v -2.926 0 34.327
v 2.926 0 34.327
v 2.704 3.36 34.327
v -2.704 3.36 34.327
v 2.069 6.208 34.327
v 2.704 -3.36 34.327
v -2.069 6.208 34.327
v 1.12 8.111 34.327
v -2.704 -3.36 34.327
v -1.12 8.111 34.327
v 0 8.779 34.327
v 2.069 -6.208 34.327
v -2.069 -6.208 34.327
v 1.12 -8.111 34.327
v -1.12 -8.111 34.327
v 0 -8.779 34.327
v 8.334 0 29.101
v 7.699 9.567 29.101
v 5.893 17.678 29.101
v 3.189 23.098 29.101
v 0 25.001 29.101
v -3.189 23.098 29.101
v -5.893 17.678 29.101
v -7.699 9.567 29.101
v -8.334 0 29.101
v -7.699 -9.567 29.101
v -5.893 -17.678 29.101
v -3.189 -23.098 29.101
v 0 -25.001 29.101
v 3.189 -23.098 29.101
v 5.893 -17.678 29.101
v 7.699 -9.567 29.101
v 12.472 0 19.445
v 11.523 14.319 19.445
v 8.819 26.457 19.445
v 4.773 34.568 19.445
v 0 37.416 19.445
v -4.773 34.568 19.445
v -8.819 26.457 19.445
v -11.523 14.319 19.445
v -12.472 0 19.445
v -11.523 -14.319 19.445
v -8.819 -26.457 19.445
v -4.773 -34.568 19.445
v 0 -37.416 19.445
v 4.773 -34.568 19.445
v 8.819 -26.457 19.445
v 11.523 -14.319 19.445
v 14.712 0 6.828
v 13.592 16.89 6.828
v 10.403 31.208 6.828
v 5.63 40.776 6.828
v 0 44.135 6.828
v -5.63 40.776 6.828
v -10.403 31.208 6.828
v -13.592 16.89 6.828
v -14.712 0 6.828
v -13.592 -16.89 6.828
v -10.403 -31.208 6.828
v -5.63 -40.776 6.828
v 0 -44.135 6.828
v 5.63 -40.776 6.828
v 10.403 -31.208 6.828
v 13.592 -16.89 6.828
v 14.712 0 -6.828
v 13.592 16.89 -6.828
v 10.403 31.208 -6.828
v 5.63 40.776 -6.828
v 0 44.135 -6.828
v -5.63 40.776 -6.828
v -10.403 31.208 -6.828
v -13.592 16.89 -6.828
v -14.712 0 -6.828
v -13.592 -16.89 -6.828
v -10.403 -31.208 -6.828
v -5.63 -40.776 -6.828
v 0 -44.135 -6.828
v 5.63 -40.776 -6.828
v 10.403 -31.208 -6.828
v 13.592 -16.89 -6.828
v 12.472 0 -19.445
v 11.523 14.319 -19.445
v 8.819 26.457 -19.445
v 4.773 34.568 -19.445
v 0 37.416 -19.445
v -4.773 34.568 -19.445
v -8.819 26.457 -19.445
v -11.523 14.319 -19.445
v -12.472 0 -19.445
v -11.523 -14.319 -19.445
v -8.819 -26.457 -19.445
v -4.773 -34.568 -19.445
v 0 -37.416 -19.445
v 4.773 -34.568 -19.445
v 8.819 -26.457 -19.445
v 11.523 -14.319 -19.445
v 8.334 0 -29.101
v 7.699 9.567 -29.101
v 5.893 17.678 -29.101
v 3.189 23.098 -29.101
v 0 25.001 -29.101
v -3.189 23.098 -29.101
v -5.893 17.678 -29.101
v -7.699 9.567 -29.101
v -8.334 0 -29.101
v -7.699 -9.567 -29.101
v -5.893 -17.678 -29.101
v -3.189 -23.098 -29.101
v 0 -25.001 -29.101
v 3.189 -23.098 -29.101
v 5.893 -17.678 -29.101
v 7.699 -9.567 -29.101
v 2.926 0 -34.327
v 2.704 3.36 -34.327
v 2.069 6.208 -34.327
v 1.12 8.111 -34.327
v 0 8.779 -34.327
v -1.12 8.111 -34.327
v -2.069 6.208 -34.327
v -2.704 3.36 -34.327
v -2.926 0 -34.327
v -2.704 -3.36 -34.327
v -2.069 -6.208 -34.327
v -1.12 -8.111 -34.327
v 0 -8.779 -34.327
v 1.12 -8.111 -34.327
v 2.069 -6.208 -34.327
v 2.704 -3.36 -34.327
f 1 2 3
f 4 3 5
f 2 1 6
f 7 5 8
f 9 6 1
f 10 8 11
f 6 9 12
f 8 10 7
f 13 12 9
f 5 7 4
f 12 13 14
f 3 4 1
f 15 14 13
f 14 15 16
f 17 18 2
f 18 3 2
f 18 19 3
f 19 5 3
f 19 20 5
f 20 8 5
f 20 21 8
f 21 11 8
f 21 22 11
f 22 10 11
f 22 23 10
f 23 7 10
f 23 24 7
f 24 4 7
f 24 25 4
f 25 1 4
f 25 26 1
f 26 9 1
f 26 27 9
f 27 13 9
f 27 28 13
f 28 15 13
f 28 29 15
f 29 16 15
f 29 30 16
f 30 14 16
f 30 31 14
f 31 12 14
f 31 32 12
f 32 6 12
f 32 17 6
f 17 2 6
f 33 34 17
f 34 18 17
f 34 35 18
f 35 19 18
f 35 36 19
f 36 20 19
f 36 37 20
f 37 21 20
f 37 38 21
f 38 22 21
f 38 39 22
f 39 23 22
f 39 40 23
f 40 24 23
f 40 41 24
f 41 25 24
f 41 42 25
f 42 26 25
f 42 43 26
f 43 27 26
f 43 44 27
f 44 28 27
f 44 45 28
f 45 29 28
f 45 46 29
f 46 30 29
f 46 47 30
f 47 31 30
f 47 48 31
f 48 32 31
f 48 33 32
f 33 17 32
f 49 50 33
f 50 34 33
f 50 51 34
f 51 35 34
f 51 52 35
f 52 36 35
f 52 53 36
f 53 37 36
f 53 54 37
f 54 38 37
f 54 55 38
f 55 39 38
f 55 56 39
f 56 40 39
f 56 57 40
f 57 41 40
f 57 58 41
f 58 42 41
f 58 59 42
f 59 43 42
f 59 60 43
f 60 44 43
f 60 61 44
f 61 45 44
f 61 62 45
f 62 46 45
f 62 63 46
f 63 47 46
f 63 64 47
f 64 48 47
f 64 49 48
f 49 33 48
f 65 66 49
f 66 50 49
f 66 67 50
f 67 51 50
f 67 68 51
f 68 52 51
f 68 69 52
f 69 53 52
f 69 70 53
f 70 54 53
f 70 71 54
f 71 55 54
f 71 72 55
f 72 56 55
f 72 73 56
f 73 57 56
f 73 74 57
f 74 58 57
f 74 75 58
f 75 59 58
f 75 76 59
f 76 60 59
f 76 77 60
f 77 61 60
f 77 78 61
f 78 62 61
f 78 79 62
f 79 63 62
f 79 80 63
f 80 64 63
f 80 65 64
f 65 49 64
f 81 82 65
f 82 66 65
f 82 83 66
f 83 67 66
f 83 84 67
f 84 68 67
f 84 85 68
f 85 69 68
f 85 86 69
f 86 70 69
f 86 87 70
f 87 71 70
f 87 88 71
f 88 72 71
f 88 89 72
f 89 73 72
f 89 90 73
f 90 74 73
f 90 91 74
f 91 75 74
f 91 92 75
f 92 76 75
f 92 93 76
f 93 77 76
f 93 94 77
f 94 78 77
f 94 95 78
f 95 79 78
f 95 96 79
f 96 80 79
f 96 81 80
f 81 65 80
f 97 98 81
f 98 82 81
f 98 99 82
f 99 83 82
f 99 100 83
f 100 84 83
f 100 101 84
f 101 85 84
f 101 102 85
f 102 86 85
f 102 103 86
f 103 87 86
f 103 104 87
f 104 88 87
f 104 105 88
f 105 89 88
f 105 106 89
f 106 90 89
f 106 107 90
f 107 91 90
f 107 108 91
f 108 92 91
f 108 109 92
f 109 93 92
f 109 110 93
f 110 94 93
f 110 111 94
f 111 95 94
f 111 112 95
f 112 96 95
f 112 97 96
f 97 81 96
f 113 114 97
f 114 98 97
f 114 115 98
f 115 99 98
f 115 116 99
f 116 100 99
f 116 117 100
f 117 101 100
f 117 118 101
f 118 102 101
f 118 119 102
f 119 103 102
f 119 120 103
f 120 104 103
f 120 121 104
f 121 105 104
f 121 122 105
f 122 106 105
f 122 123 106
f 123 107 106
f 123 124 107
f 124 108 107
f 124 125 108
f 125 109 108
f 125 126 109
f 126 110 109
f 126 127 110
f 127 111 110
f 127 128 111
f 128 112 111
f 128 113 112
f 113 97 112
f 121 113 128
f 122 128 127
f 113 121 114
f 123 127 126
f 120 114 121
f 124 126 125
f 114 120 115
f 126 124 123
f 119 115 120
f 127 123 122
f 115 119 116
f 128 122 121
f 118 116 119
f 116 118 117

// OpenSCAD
// Generated by SolidPython 1.0.1 on 2020-07-29 00:46:45


scale(v = [3, 9, 7]) {
	sphere(r = 5);
}
/***********************************************
*********      SolidPython code:      **********
************************************************
 
# import packages: SolidPython
from solid import *
from solid.utils import *
from itertools import chain, combinations, permutations


class Resize:

    def __init__(self, scad_file):
        self.scad_file = scad_file
        #self.scad_file = import_scad(scad_file)
        # cone/cylinder param:
        self.r1 = 0
        self.r2 = 0
        self.h = 0
        # rectangular prism param:
        self.w = 0
        self.l = 0
        # ellipse param:
        self.r = 0

    # import OpenScad code (file name corresponds to shape)


    # classify shape + parameters
    def assign(self, param1, param2, param3):
        if self.scad_file == 'cone.scad':
            self.r1 = param1
            self.r2 = param2
            self.h = param3
        elif self.scad_file == 'cylinder.scad':
            self.r1 = param1
            self.r2 = param2
            self.h = param3
        elif self.scad_file == 'rectangularPrism.scad':
            self.h = param1
            self.l = param2
            self.w = param3
        else:
            self.r = param1
            self.h = param2

    # resize parameters
    def iterate(self):
        x = range(3, 20, 2)
        i = 1
        if self.scad_file == 'cone.scad':
            tempList = list(permutations(x, 2))
            for temp in tempList:
                param1 = temp[0]
                param2 = temp[1]
                filepath = 'produced_scad_files/' + 'cone' + str(param1) + '_' + str(param2) + '_' + '.scad'
                scad_render_to_file(cylinder(h=param1, r1=param2, r2=0), filepath)

        elif self.scad_file == 'cylinder.scad':
            tempList = list(permutations(x, 3))
            for temp in tempList:
                param1 = temp[0]
                param2 = temp[1]
                filepath = 'produced_scad_files/' + 'cylinder' + str(param1) + '_' + str(param2) + '_' + '.scad'
                scad_render_to_file(cylinder(h=param1, r1=param2, r2=param2), filepath)

        elif self.scad_file == 'rectangularPrism.scad':
            tempList = list(permutations(x, 3))
            for temp in tempList:
                param1 = temp[0]
                param2 = temp[1]
                param3 = temp[2]
                filepath = 'produced_scad_files/' + 'rectangularPrism' + str(param1) + '_' + str(param2) + '_' + str(
                    param3) + '.scad'
                scad_render_to_file(cube(size=(param1, param2, param3)), filepath)

        elif self.scad_file == 'ellipse.scad':
            tempList = list(permutations(x, 4))
            for temp in tempList:
                param1 = temp[0]
                param2 = temp[1]
                param3 = temp[2]
                param4 = temp[3]
                filepath = 'produced_scad_files/' + 'ellipse' + str(param1) + '_' + str(param2) + '_' + str(param3) + '_' + str(param4) + '.scad'
                scad_render_to_file(scale([param1, param2, param3])(sphere(r=param4)), filepath)

    def render_to_scadfile(self):
        scad_render_to_file(scad, 'example.scad') 
 
************************************************/
